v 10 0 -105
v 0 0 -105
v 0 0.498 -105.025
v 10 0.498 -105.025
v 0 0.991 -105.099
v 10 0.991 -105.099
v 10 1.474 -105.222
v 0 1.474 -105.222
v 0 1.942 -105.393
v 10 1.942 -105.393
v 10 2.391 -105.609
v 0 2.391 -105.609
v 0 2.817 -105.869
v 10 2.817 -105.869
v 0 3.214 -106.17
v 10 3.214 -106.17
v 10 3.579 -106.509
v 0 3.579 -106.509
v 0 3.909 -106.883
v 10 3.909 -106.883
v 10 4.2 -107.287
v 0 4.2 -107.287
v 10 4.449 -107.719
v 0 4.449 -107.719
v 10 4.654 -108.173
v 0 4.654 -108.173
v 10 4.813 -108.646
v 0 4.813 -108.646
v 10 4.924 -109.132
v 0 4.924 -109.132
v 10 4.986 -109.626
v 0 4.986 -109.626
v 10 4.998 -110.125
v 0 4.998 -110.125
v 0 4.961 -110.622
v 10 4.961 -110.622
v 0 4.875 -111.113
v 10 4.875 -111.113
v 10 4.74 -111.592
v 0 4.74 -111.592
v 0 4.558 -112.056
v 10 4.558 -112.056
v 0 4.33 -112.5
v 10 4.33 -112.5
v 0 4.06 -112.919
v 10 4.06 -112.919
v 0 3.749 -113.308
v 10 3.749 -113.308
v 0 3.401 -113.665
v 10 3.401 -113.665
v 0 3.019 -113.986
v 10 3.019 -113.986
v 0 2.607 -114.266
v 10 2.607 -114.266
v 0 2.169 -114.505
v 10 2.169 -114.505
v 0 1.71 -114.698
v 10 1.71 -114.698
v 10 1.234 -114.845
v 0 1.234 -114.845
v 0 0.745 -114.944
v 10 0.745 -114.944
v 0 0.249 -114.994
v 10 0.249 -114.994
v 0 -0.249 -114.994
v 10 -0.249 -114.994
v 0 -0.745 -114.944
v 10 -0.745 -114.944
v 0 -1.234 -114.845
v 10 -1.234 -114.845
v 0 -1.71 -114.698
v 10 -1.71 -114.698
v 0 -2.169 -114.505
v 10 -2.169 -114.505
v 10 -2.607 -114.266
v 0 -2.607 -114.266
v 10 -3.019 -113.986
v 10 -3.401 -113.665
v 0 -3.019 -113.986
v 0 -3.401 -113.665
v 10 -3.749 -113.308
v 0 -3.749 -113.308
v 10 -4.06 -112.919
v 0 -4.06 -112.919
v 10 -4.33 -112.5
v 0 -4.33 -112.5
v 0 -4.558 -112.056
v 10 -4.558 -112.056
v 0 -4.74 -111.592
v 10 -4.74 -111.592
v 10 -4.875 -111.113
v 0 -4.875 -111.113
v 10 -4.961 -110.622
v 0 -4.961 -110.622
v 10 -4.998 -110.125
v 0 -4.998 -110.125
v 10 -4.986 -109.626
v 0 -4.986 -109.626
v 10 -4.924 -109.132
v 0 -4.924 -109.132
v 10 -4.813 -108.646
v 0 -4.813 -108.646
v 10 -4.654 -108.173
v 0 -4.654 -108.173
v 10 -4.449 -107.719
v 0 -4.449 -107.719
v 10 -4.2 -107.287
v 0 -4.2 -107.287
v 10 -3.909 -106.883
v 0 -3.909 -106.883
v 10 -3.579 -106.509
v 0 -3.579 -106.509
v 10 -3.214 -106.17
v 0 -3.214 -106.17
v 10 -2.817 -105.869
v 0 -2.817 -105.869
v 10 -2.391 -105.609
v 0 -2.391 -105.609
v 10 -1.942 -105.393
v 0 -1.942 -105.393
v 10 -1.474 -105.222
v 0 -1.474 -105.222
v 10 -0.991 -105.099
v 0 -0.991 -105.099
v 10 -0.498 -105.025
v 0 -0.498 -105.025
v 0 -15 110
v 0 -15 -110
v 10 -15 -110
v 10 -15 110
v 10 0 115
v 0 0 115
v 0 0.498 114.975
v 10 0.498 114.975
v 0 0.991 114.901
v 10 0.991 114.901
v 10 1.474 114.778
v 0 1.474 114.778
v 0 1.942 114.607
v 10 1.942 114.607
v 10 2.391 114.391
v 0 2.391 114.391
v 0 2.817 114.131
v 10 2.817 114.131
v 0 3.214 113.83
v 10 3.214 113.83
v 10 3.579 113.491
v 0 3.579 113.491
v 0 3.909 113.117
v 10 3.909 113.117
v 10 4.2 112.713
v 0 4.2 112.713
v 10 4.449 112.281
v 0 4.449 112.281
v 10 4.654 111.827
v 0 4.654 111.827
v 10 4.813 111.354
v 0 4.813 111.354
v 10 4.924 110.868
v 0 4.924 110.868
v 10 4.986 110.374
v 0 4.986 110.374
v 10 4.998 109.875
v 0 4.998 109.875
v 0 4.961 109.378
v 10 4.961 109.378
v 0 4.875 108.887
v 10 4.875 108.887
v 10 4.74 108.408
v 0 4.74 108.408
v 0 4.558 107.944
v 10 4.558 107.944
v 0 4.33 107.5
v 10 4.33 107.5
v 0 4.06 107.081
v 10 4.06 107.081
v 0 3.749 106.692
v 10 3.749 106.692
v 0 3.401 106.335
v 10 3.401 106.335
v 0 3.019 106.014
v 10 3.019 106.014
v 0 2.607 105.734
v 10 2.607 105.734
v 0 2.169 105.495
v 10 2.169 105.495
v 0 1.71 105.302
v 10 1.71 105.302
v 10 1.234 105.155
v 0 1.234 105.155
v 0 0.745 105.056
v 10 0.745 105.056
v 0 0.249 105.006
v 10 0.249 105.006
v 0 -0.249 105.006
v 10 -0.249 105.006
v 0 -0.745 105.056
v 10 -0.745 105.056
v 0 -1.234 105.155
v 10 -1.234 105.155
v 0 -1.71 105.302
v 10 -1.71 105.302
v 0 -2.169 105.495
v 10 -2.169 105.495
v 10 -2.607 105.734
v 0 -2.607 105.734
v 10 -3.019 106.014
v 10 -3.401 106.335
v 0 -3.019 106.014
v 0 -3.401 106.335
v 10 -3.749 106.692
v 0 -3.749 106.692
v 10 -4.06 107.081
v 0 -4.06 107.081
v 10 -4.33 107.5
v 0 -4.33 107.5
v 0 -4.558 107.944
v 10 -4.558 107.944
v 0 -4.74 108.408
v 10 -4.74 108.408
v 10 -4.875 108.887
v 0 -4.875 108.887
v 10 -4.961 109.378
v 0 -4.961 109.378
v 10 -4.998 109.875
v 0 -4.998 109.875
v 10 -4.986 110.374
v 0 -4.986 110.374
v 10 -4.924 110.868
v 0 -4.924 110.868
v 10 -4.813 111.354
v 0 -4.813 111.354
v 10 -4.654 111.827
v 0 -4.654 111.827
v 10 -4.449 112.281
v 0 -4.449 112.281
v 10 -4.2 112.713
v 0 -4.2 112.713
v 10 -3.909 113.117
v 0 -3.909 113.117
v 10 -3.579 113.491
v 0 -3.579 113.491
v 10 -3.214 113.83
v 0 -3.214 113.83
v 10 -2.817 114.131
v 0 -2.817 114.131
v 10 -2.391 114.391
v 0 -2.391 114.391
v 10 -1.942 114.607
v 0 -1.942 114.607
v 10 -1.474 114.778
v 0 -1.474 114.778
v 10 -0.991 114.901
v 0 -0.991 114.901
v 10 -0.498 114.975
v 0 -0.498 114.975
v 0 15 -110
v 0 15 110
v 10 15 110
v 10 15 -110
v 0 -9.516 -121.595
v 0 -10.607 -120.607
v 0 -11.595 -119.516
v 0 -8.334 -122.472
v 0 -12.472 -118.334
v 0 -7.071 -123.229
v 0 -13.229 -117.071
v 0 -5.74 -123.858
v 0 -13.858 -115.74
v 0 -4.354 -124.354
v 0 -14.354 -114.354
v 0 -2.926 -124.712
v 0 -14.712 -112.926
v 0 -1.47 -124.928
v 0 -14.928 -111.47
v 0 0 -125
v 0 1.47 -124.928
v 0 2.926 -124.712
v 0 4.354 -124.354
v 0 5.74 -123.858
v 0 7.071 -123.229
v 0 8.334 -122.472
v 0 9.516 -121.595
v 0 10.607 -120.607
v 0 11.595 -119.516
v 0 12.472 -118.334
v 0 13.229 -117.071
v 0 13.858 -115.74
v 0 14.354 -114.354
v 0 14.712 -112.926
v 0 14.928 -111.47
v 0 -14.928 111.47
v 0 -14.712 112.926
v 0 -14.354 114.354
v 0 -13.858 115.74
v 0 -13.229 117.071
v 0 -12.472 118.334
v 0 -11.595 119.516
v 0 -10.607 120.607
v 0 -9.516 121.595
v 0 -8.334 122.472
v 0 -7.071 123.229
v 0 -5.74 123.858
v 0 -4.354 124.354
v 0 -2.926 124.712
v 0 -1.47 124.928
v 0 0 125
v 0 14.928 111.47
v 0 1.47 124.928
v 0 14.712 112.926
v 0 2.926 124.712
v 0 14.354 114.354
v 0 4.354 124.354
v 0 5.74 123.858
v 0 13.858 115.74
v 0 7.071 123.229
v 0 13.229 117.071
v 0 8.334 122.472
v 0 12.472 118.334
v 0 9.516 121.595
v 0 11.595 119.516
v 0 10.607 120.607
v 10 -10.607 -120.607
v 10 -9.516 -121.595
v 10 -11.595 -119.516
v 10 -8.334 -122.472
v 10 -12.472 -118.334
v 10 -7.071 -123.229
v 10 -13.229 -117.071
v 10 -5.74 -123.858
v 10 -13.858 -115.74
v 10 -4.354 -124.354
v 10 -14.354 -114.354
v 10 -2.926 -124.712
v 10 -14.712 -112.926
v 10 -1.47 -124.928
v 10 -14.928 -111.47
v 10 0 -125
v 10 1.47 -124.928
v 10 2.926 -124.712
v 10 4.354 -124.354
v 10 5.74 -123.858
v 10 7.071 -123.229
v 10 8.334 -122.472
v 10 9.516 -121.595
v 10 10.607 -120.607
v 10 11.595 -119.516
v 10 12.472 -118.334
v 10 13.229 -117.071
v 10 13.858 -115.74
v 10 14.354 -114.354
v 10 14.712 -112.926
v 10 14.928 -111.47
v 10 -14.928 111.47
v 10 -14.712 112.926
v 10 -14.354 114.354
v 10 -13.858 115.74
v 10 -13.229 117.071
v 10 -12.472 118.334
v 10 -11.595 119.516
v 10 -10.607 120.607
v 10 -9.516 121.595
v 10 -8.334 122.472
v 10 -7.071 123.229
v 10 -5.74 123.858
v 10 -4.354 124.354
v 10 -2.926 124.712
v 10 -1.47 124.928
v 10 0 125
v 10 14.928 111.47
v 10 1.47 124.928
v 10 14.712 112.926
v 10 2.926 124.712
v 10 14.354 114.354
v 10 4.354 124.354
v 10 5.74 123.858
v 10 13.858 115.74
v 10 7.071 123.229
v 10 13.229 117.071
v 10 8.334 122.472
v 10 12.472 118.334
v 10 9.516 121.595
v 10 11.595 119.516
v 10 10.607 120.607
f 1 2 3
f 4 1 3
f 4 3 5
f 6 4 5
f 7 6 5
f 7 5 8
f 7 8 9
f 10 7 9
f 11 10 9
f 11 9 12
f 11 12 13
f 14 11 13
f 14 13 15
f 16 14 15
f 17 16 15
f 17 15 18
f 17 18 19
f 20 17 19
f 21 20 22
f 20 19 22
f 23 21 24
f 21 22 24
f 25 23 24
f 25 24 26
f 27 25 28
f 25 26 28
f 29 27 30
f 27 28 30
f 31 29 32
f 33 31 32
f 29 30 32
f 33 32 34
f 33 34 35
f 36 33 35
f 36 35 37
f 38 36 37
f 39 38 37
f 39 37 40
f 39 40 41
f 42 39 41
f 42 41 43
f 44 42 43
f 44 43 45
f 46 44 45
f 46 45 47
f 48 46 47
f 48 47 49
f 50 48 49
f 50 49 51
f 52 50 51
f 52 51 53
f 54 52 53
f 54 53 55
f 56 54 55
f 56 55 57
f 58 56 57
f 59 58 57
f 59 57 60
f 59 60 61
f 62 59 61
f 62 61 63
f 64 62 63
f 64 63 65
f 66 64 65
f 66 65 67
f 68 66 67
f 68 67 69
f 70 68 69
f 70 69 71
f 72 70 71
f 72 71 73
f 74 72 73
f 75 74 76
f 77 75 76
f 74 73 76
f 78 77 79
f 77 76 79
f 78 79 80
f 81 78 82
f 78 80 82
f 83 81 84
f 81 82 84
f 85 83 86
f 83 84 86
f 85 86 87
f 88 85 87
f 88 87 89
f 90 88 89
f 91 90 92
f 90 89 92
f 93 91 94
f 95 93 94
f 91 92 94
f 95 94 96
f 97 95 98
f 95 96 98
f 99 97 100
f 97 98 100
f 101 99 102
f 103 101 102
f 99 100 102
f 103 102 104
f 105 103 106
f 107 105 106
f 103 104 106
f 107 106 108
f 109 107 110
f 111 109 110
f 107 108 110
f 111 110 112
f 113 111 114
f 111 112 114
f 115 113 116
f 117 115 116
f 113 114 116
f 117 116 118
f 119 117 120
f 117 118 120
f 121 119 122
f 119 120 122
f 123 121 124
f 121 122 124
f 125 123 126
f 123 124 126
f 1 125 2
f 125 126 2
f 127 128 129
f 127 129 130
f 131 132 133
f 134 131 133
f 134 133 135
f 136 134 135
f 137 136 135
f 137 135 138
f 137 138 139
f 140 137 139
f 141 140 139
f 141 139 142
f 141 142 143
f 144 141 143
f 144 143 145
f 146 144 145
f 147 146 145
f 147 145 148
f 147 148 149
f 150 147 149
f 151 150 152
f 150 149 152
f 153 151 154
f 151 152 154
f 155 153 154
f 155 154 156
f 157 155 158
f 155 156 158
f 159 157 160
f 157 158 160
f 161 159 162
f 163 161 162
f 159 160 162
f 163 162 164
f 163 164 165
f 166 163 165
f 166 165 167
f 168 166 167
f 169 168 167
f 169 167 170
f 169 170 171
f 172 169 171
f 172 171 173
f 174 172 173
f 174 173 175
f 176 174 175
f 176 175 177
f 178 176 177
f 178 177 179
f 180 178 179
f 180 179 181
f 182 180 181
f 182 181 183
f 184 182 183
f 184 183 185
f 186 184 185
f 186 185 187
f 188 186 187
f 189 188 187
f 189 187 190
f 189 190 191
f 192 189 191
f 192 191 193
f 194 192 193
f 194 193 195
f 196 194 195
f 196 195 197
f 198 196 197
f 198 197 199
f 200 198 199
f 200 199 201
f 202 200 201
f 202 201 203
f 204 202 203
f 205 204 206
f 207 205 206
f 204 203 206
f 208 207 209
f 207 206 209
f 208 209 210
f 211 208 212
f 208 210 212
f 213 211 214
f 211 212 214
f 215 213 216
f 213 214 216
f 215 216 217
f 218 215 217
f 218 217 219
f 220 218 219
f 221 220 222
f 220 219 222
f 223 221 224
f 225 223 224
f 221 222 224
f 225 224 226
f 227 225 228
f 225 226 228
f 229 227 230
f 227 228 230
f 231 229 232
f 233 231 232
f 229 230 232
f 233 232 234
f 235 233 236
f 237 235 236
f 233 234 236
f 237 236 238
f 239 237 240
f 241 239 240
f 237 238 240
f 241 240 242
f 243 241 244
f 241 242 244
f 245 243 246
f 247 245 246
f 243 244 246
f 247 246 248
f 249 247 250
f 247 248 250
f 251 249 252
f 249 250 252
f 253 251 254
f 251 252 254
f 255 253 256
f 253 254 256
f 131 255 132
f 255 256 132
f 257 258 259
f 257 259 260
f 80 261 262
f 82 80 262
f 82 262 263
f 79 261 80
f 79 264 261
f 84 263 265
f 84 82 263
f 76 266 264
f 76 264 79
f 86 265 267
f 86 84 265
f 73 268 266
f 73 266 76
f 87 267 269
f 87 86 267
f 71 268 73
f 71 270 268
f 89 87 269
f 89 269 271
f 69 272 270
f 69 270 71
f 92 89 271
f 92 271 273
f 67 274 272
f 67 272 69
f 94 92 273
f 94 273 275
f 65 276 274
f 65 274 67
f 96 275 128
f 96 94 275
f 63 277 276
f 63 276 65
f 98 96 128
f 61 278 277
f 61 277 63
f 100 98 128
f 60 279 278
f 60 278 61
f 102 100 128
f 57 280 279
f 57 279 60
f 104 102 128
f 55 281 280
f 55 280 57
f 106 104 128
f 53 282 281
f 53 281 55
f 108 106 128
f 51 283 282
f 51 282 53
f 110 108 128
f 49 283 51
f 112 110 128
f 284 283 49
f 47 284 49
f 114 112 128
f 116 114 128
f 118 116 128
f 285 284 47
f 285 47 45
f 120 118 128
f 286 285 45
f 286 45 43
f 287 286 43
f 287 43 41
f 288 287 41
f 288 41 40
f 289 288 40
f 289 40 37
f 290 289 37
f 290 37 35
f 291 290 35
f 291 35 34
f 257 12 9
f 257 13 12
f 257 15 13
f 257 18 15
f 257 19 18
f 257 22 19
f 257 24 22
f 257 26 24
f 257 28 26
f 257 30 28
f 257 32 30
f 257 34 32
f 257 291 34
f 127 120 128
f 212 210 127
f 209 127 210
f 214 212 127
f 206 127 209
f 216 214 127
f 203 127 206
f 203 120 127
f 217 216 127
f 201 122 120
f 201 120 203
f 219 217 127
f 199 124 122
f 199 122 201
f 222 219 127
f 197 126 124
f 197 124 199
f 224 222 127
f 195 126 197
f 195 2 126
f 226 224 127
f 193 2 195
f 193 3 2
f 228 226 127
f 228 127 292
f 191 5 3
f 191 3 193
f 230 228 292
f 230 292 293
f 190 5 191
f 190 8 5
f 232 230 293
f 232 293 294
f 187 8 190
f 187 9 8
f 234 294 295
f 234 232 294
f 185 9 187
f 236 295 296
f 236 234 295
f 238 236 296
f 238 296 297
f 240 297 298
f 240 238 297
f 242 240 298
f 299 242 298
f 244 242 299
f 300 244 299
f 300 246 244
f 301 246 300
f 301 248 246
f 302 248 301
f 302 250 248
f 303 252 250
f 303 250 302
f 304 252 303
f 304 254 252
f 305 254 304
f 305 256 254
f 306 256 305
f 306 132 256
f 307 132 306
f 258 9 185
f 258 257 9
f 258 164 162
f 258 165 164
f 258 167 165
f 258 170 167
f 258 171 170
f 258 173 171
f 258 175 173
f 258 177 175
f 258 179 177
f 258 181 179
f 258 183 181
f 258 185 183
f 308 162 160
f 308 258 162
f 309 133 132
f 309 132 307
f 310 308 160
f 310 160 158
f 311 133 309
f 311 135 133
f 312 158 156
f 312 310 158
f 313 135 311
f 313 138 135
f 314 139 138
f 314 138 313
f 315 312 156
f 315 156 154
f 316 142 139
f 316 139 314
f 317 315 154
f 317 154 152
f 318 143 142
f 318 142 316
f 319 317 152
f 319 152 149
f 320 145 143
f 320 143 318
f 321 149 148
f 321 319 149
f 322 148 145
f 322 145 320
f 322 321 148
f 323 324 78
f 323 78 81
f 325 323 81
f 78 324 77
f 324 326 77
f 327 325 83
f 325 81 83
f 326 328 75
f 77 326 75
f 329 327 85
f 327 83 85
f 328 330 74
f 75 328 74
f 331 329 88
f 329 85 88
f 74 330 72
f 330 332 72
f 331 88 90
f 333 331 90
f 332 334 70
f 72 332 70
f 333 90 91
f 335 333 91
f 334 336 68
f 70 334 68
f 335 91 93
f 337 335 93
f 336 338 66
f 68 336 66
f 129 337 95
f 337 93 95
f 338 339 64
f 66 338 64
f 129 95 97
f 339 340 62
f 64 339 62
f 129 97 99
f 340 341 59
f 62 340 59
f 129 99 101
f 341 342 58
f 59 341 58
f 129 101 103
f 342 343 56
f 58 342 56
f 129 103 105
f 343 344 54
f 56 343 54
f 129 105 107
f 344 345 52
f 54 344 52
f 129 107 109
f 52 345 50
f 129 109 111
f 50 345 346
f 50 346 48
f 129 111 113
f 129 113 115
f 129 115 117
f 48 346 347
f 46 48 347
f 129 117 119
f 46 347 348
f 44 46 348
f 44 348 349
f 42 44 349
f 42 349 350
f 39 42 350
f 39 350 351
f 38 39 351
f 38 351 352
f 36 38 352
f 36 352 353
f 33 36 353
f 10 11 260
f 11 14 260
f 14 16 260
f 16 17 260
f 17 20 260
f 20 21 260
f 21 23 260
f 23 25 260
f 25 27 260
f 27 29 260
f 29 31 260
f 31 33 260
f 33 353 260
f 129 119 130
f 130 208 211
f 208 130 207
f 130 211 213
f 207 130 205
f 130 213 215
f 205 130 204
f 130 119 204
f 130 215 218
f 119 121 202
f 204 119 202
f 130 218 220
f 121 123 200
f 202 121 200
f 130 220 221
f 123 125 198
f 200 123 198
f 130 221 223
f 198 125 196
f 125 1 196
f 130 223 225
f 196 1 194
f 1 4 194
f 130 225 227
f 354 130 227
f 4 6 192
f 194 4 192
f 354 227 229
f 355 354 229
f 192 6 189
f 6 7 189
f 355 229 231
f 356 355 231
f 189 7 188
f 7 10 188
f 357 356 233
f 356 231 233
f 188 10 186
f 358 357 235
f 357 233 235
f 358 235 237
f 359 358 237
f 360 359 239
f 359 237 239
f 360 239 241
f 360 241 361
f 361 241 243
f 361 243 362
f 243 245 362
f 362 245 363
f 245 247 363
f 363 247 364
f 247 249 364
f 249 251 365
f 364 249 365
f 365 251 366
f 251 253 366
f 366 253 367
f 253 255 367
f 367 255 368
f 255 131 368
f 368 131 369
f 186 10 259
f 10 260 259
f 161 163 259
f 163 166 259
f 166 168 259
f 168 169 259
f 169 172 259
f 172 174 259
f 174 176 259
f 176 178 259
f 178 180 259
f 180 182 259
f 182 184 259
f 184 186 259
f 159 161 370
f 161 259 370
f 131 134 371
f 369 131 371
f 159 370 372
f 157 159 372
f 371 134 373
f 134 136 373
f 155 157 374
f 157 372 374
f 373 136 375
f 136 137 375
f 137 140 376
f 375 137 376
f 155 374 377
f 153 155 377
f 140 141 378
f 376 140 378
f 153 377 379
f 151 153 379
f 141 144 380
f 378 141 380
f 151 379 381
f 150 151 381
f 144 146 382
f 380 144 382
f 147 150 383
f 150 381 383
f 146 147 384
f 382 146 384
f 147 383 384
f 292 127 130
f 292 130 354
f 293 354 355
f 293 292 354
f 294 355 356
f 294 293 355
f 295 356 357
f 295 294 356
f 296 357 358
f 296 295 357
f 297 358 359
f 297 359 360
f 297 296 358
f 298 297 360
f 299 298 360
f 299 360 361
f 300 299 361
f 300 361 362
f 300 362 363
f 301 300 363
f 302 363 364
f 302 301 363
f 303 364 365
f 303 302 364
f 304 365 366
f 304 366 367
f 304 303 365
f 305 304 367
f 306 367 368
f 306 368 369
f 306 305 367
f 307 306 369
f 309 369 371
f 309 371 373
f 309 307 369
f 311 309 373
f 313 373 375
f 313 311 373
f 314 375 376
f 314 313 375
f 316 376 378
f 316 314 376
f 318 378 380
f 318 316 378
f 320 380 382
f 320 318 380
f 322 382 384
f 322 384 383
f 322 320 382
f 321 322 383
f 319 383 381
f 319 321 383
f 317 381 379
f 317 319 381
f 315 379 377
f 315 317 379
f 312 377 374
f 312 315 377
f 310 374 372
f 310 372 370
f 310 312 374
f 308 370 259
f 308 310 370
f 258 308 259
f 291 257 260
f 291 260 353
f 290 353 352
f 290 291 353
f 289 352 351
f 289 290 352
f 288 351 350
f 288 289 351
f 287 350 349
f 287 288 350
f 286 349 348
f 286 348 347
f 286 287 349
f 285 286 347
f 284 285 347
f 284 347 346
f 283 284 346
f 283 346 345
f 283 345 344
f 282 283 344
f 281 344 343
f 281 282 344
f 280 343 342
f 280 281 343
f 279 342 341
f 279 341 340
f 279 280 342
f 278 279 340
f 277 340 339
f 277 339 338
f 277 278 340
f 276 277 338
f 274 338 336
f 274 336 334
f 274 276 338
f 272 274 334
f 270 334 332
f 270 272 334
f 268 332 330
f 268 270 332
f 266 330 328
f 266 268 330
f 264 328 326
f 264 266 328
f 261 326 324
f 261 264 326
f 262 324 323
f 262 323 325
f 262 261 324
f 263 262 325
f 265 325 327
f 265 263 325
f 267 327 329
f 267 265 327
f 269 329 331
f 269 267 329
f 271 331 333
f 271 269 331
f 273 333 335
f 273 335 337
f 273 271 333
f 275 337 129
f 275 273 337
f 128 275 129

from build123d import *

# Parameters (mm, degrees)
BOSS_EXTRUDE1_DEPTH = 10
CUT_EXTRUDE1_REACH  = 12
SKETCH3_R           = 5
CUT_EXTRUDE3_REACH  = 12
SKETCH2_R           = 5


with BuildPart() as part:
    # Sketch1 → Boss-Extrude1 (new body)
    with BuildSketch(Plane(origin=(0, 0, 0), x_dir=(0, 0, -1), z_dir=(1, 0, 0))):
        with BuildLine():
            Line((-110, 15), (110, 15))
            ThreePointArc((110, 15), (125, 0), (110, -15))
            Line((110, -15), (-110, -15))
            ThreePointArc((-110, -15), (-125, 0), (-110, 15))
        make_face()
    extrude(amount=BOSS_EXTRUDE1_DEPTH)

    # Sketch3 → Cut-Extrude1 (cut, up to next)
    with BuildSketch(Plane.ZY, mode=Mode.PRIVATE) as cut_extrude1_sk1:
        with Locations((110, 0)):
            Circle(SKETCH3_R)
    cut_extrude1_tool1 = extrude(cut_extrude1_sk1.sketch, amount=-CUT_EXTRUDE1_REACH, mode=Mode.PRIVATE) & part.part
    add(cut_extrude1_tool1.solids().sort_by_distance((0, 0, 110))[0], mode=Mode.SUBTRACT)

    # Sketch2 → Cut-Extrude3 (cut, up to next)
    with BuildSketch(Plane.ZY, mode=Mode.PRIVATE) as cut_extrude3_sk1:
        with Locations((-110, 0)):
            Circle(SKETCH2_R)
    cut_extrude3_tool1 = extrude(cut_extrude3_sk1.sketch, amount=-CUT_EXTRUDE3_REACH, mode=Mode.PRIVATE) & part.part
    add(cut_extrude3_tool1.solids().sort_by_distance((0, 0, -110))[0], mode=Mode.SUBTRACT)


solid = part.part
